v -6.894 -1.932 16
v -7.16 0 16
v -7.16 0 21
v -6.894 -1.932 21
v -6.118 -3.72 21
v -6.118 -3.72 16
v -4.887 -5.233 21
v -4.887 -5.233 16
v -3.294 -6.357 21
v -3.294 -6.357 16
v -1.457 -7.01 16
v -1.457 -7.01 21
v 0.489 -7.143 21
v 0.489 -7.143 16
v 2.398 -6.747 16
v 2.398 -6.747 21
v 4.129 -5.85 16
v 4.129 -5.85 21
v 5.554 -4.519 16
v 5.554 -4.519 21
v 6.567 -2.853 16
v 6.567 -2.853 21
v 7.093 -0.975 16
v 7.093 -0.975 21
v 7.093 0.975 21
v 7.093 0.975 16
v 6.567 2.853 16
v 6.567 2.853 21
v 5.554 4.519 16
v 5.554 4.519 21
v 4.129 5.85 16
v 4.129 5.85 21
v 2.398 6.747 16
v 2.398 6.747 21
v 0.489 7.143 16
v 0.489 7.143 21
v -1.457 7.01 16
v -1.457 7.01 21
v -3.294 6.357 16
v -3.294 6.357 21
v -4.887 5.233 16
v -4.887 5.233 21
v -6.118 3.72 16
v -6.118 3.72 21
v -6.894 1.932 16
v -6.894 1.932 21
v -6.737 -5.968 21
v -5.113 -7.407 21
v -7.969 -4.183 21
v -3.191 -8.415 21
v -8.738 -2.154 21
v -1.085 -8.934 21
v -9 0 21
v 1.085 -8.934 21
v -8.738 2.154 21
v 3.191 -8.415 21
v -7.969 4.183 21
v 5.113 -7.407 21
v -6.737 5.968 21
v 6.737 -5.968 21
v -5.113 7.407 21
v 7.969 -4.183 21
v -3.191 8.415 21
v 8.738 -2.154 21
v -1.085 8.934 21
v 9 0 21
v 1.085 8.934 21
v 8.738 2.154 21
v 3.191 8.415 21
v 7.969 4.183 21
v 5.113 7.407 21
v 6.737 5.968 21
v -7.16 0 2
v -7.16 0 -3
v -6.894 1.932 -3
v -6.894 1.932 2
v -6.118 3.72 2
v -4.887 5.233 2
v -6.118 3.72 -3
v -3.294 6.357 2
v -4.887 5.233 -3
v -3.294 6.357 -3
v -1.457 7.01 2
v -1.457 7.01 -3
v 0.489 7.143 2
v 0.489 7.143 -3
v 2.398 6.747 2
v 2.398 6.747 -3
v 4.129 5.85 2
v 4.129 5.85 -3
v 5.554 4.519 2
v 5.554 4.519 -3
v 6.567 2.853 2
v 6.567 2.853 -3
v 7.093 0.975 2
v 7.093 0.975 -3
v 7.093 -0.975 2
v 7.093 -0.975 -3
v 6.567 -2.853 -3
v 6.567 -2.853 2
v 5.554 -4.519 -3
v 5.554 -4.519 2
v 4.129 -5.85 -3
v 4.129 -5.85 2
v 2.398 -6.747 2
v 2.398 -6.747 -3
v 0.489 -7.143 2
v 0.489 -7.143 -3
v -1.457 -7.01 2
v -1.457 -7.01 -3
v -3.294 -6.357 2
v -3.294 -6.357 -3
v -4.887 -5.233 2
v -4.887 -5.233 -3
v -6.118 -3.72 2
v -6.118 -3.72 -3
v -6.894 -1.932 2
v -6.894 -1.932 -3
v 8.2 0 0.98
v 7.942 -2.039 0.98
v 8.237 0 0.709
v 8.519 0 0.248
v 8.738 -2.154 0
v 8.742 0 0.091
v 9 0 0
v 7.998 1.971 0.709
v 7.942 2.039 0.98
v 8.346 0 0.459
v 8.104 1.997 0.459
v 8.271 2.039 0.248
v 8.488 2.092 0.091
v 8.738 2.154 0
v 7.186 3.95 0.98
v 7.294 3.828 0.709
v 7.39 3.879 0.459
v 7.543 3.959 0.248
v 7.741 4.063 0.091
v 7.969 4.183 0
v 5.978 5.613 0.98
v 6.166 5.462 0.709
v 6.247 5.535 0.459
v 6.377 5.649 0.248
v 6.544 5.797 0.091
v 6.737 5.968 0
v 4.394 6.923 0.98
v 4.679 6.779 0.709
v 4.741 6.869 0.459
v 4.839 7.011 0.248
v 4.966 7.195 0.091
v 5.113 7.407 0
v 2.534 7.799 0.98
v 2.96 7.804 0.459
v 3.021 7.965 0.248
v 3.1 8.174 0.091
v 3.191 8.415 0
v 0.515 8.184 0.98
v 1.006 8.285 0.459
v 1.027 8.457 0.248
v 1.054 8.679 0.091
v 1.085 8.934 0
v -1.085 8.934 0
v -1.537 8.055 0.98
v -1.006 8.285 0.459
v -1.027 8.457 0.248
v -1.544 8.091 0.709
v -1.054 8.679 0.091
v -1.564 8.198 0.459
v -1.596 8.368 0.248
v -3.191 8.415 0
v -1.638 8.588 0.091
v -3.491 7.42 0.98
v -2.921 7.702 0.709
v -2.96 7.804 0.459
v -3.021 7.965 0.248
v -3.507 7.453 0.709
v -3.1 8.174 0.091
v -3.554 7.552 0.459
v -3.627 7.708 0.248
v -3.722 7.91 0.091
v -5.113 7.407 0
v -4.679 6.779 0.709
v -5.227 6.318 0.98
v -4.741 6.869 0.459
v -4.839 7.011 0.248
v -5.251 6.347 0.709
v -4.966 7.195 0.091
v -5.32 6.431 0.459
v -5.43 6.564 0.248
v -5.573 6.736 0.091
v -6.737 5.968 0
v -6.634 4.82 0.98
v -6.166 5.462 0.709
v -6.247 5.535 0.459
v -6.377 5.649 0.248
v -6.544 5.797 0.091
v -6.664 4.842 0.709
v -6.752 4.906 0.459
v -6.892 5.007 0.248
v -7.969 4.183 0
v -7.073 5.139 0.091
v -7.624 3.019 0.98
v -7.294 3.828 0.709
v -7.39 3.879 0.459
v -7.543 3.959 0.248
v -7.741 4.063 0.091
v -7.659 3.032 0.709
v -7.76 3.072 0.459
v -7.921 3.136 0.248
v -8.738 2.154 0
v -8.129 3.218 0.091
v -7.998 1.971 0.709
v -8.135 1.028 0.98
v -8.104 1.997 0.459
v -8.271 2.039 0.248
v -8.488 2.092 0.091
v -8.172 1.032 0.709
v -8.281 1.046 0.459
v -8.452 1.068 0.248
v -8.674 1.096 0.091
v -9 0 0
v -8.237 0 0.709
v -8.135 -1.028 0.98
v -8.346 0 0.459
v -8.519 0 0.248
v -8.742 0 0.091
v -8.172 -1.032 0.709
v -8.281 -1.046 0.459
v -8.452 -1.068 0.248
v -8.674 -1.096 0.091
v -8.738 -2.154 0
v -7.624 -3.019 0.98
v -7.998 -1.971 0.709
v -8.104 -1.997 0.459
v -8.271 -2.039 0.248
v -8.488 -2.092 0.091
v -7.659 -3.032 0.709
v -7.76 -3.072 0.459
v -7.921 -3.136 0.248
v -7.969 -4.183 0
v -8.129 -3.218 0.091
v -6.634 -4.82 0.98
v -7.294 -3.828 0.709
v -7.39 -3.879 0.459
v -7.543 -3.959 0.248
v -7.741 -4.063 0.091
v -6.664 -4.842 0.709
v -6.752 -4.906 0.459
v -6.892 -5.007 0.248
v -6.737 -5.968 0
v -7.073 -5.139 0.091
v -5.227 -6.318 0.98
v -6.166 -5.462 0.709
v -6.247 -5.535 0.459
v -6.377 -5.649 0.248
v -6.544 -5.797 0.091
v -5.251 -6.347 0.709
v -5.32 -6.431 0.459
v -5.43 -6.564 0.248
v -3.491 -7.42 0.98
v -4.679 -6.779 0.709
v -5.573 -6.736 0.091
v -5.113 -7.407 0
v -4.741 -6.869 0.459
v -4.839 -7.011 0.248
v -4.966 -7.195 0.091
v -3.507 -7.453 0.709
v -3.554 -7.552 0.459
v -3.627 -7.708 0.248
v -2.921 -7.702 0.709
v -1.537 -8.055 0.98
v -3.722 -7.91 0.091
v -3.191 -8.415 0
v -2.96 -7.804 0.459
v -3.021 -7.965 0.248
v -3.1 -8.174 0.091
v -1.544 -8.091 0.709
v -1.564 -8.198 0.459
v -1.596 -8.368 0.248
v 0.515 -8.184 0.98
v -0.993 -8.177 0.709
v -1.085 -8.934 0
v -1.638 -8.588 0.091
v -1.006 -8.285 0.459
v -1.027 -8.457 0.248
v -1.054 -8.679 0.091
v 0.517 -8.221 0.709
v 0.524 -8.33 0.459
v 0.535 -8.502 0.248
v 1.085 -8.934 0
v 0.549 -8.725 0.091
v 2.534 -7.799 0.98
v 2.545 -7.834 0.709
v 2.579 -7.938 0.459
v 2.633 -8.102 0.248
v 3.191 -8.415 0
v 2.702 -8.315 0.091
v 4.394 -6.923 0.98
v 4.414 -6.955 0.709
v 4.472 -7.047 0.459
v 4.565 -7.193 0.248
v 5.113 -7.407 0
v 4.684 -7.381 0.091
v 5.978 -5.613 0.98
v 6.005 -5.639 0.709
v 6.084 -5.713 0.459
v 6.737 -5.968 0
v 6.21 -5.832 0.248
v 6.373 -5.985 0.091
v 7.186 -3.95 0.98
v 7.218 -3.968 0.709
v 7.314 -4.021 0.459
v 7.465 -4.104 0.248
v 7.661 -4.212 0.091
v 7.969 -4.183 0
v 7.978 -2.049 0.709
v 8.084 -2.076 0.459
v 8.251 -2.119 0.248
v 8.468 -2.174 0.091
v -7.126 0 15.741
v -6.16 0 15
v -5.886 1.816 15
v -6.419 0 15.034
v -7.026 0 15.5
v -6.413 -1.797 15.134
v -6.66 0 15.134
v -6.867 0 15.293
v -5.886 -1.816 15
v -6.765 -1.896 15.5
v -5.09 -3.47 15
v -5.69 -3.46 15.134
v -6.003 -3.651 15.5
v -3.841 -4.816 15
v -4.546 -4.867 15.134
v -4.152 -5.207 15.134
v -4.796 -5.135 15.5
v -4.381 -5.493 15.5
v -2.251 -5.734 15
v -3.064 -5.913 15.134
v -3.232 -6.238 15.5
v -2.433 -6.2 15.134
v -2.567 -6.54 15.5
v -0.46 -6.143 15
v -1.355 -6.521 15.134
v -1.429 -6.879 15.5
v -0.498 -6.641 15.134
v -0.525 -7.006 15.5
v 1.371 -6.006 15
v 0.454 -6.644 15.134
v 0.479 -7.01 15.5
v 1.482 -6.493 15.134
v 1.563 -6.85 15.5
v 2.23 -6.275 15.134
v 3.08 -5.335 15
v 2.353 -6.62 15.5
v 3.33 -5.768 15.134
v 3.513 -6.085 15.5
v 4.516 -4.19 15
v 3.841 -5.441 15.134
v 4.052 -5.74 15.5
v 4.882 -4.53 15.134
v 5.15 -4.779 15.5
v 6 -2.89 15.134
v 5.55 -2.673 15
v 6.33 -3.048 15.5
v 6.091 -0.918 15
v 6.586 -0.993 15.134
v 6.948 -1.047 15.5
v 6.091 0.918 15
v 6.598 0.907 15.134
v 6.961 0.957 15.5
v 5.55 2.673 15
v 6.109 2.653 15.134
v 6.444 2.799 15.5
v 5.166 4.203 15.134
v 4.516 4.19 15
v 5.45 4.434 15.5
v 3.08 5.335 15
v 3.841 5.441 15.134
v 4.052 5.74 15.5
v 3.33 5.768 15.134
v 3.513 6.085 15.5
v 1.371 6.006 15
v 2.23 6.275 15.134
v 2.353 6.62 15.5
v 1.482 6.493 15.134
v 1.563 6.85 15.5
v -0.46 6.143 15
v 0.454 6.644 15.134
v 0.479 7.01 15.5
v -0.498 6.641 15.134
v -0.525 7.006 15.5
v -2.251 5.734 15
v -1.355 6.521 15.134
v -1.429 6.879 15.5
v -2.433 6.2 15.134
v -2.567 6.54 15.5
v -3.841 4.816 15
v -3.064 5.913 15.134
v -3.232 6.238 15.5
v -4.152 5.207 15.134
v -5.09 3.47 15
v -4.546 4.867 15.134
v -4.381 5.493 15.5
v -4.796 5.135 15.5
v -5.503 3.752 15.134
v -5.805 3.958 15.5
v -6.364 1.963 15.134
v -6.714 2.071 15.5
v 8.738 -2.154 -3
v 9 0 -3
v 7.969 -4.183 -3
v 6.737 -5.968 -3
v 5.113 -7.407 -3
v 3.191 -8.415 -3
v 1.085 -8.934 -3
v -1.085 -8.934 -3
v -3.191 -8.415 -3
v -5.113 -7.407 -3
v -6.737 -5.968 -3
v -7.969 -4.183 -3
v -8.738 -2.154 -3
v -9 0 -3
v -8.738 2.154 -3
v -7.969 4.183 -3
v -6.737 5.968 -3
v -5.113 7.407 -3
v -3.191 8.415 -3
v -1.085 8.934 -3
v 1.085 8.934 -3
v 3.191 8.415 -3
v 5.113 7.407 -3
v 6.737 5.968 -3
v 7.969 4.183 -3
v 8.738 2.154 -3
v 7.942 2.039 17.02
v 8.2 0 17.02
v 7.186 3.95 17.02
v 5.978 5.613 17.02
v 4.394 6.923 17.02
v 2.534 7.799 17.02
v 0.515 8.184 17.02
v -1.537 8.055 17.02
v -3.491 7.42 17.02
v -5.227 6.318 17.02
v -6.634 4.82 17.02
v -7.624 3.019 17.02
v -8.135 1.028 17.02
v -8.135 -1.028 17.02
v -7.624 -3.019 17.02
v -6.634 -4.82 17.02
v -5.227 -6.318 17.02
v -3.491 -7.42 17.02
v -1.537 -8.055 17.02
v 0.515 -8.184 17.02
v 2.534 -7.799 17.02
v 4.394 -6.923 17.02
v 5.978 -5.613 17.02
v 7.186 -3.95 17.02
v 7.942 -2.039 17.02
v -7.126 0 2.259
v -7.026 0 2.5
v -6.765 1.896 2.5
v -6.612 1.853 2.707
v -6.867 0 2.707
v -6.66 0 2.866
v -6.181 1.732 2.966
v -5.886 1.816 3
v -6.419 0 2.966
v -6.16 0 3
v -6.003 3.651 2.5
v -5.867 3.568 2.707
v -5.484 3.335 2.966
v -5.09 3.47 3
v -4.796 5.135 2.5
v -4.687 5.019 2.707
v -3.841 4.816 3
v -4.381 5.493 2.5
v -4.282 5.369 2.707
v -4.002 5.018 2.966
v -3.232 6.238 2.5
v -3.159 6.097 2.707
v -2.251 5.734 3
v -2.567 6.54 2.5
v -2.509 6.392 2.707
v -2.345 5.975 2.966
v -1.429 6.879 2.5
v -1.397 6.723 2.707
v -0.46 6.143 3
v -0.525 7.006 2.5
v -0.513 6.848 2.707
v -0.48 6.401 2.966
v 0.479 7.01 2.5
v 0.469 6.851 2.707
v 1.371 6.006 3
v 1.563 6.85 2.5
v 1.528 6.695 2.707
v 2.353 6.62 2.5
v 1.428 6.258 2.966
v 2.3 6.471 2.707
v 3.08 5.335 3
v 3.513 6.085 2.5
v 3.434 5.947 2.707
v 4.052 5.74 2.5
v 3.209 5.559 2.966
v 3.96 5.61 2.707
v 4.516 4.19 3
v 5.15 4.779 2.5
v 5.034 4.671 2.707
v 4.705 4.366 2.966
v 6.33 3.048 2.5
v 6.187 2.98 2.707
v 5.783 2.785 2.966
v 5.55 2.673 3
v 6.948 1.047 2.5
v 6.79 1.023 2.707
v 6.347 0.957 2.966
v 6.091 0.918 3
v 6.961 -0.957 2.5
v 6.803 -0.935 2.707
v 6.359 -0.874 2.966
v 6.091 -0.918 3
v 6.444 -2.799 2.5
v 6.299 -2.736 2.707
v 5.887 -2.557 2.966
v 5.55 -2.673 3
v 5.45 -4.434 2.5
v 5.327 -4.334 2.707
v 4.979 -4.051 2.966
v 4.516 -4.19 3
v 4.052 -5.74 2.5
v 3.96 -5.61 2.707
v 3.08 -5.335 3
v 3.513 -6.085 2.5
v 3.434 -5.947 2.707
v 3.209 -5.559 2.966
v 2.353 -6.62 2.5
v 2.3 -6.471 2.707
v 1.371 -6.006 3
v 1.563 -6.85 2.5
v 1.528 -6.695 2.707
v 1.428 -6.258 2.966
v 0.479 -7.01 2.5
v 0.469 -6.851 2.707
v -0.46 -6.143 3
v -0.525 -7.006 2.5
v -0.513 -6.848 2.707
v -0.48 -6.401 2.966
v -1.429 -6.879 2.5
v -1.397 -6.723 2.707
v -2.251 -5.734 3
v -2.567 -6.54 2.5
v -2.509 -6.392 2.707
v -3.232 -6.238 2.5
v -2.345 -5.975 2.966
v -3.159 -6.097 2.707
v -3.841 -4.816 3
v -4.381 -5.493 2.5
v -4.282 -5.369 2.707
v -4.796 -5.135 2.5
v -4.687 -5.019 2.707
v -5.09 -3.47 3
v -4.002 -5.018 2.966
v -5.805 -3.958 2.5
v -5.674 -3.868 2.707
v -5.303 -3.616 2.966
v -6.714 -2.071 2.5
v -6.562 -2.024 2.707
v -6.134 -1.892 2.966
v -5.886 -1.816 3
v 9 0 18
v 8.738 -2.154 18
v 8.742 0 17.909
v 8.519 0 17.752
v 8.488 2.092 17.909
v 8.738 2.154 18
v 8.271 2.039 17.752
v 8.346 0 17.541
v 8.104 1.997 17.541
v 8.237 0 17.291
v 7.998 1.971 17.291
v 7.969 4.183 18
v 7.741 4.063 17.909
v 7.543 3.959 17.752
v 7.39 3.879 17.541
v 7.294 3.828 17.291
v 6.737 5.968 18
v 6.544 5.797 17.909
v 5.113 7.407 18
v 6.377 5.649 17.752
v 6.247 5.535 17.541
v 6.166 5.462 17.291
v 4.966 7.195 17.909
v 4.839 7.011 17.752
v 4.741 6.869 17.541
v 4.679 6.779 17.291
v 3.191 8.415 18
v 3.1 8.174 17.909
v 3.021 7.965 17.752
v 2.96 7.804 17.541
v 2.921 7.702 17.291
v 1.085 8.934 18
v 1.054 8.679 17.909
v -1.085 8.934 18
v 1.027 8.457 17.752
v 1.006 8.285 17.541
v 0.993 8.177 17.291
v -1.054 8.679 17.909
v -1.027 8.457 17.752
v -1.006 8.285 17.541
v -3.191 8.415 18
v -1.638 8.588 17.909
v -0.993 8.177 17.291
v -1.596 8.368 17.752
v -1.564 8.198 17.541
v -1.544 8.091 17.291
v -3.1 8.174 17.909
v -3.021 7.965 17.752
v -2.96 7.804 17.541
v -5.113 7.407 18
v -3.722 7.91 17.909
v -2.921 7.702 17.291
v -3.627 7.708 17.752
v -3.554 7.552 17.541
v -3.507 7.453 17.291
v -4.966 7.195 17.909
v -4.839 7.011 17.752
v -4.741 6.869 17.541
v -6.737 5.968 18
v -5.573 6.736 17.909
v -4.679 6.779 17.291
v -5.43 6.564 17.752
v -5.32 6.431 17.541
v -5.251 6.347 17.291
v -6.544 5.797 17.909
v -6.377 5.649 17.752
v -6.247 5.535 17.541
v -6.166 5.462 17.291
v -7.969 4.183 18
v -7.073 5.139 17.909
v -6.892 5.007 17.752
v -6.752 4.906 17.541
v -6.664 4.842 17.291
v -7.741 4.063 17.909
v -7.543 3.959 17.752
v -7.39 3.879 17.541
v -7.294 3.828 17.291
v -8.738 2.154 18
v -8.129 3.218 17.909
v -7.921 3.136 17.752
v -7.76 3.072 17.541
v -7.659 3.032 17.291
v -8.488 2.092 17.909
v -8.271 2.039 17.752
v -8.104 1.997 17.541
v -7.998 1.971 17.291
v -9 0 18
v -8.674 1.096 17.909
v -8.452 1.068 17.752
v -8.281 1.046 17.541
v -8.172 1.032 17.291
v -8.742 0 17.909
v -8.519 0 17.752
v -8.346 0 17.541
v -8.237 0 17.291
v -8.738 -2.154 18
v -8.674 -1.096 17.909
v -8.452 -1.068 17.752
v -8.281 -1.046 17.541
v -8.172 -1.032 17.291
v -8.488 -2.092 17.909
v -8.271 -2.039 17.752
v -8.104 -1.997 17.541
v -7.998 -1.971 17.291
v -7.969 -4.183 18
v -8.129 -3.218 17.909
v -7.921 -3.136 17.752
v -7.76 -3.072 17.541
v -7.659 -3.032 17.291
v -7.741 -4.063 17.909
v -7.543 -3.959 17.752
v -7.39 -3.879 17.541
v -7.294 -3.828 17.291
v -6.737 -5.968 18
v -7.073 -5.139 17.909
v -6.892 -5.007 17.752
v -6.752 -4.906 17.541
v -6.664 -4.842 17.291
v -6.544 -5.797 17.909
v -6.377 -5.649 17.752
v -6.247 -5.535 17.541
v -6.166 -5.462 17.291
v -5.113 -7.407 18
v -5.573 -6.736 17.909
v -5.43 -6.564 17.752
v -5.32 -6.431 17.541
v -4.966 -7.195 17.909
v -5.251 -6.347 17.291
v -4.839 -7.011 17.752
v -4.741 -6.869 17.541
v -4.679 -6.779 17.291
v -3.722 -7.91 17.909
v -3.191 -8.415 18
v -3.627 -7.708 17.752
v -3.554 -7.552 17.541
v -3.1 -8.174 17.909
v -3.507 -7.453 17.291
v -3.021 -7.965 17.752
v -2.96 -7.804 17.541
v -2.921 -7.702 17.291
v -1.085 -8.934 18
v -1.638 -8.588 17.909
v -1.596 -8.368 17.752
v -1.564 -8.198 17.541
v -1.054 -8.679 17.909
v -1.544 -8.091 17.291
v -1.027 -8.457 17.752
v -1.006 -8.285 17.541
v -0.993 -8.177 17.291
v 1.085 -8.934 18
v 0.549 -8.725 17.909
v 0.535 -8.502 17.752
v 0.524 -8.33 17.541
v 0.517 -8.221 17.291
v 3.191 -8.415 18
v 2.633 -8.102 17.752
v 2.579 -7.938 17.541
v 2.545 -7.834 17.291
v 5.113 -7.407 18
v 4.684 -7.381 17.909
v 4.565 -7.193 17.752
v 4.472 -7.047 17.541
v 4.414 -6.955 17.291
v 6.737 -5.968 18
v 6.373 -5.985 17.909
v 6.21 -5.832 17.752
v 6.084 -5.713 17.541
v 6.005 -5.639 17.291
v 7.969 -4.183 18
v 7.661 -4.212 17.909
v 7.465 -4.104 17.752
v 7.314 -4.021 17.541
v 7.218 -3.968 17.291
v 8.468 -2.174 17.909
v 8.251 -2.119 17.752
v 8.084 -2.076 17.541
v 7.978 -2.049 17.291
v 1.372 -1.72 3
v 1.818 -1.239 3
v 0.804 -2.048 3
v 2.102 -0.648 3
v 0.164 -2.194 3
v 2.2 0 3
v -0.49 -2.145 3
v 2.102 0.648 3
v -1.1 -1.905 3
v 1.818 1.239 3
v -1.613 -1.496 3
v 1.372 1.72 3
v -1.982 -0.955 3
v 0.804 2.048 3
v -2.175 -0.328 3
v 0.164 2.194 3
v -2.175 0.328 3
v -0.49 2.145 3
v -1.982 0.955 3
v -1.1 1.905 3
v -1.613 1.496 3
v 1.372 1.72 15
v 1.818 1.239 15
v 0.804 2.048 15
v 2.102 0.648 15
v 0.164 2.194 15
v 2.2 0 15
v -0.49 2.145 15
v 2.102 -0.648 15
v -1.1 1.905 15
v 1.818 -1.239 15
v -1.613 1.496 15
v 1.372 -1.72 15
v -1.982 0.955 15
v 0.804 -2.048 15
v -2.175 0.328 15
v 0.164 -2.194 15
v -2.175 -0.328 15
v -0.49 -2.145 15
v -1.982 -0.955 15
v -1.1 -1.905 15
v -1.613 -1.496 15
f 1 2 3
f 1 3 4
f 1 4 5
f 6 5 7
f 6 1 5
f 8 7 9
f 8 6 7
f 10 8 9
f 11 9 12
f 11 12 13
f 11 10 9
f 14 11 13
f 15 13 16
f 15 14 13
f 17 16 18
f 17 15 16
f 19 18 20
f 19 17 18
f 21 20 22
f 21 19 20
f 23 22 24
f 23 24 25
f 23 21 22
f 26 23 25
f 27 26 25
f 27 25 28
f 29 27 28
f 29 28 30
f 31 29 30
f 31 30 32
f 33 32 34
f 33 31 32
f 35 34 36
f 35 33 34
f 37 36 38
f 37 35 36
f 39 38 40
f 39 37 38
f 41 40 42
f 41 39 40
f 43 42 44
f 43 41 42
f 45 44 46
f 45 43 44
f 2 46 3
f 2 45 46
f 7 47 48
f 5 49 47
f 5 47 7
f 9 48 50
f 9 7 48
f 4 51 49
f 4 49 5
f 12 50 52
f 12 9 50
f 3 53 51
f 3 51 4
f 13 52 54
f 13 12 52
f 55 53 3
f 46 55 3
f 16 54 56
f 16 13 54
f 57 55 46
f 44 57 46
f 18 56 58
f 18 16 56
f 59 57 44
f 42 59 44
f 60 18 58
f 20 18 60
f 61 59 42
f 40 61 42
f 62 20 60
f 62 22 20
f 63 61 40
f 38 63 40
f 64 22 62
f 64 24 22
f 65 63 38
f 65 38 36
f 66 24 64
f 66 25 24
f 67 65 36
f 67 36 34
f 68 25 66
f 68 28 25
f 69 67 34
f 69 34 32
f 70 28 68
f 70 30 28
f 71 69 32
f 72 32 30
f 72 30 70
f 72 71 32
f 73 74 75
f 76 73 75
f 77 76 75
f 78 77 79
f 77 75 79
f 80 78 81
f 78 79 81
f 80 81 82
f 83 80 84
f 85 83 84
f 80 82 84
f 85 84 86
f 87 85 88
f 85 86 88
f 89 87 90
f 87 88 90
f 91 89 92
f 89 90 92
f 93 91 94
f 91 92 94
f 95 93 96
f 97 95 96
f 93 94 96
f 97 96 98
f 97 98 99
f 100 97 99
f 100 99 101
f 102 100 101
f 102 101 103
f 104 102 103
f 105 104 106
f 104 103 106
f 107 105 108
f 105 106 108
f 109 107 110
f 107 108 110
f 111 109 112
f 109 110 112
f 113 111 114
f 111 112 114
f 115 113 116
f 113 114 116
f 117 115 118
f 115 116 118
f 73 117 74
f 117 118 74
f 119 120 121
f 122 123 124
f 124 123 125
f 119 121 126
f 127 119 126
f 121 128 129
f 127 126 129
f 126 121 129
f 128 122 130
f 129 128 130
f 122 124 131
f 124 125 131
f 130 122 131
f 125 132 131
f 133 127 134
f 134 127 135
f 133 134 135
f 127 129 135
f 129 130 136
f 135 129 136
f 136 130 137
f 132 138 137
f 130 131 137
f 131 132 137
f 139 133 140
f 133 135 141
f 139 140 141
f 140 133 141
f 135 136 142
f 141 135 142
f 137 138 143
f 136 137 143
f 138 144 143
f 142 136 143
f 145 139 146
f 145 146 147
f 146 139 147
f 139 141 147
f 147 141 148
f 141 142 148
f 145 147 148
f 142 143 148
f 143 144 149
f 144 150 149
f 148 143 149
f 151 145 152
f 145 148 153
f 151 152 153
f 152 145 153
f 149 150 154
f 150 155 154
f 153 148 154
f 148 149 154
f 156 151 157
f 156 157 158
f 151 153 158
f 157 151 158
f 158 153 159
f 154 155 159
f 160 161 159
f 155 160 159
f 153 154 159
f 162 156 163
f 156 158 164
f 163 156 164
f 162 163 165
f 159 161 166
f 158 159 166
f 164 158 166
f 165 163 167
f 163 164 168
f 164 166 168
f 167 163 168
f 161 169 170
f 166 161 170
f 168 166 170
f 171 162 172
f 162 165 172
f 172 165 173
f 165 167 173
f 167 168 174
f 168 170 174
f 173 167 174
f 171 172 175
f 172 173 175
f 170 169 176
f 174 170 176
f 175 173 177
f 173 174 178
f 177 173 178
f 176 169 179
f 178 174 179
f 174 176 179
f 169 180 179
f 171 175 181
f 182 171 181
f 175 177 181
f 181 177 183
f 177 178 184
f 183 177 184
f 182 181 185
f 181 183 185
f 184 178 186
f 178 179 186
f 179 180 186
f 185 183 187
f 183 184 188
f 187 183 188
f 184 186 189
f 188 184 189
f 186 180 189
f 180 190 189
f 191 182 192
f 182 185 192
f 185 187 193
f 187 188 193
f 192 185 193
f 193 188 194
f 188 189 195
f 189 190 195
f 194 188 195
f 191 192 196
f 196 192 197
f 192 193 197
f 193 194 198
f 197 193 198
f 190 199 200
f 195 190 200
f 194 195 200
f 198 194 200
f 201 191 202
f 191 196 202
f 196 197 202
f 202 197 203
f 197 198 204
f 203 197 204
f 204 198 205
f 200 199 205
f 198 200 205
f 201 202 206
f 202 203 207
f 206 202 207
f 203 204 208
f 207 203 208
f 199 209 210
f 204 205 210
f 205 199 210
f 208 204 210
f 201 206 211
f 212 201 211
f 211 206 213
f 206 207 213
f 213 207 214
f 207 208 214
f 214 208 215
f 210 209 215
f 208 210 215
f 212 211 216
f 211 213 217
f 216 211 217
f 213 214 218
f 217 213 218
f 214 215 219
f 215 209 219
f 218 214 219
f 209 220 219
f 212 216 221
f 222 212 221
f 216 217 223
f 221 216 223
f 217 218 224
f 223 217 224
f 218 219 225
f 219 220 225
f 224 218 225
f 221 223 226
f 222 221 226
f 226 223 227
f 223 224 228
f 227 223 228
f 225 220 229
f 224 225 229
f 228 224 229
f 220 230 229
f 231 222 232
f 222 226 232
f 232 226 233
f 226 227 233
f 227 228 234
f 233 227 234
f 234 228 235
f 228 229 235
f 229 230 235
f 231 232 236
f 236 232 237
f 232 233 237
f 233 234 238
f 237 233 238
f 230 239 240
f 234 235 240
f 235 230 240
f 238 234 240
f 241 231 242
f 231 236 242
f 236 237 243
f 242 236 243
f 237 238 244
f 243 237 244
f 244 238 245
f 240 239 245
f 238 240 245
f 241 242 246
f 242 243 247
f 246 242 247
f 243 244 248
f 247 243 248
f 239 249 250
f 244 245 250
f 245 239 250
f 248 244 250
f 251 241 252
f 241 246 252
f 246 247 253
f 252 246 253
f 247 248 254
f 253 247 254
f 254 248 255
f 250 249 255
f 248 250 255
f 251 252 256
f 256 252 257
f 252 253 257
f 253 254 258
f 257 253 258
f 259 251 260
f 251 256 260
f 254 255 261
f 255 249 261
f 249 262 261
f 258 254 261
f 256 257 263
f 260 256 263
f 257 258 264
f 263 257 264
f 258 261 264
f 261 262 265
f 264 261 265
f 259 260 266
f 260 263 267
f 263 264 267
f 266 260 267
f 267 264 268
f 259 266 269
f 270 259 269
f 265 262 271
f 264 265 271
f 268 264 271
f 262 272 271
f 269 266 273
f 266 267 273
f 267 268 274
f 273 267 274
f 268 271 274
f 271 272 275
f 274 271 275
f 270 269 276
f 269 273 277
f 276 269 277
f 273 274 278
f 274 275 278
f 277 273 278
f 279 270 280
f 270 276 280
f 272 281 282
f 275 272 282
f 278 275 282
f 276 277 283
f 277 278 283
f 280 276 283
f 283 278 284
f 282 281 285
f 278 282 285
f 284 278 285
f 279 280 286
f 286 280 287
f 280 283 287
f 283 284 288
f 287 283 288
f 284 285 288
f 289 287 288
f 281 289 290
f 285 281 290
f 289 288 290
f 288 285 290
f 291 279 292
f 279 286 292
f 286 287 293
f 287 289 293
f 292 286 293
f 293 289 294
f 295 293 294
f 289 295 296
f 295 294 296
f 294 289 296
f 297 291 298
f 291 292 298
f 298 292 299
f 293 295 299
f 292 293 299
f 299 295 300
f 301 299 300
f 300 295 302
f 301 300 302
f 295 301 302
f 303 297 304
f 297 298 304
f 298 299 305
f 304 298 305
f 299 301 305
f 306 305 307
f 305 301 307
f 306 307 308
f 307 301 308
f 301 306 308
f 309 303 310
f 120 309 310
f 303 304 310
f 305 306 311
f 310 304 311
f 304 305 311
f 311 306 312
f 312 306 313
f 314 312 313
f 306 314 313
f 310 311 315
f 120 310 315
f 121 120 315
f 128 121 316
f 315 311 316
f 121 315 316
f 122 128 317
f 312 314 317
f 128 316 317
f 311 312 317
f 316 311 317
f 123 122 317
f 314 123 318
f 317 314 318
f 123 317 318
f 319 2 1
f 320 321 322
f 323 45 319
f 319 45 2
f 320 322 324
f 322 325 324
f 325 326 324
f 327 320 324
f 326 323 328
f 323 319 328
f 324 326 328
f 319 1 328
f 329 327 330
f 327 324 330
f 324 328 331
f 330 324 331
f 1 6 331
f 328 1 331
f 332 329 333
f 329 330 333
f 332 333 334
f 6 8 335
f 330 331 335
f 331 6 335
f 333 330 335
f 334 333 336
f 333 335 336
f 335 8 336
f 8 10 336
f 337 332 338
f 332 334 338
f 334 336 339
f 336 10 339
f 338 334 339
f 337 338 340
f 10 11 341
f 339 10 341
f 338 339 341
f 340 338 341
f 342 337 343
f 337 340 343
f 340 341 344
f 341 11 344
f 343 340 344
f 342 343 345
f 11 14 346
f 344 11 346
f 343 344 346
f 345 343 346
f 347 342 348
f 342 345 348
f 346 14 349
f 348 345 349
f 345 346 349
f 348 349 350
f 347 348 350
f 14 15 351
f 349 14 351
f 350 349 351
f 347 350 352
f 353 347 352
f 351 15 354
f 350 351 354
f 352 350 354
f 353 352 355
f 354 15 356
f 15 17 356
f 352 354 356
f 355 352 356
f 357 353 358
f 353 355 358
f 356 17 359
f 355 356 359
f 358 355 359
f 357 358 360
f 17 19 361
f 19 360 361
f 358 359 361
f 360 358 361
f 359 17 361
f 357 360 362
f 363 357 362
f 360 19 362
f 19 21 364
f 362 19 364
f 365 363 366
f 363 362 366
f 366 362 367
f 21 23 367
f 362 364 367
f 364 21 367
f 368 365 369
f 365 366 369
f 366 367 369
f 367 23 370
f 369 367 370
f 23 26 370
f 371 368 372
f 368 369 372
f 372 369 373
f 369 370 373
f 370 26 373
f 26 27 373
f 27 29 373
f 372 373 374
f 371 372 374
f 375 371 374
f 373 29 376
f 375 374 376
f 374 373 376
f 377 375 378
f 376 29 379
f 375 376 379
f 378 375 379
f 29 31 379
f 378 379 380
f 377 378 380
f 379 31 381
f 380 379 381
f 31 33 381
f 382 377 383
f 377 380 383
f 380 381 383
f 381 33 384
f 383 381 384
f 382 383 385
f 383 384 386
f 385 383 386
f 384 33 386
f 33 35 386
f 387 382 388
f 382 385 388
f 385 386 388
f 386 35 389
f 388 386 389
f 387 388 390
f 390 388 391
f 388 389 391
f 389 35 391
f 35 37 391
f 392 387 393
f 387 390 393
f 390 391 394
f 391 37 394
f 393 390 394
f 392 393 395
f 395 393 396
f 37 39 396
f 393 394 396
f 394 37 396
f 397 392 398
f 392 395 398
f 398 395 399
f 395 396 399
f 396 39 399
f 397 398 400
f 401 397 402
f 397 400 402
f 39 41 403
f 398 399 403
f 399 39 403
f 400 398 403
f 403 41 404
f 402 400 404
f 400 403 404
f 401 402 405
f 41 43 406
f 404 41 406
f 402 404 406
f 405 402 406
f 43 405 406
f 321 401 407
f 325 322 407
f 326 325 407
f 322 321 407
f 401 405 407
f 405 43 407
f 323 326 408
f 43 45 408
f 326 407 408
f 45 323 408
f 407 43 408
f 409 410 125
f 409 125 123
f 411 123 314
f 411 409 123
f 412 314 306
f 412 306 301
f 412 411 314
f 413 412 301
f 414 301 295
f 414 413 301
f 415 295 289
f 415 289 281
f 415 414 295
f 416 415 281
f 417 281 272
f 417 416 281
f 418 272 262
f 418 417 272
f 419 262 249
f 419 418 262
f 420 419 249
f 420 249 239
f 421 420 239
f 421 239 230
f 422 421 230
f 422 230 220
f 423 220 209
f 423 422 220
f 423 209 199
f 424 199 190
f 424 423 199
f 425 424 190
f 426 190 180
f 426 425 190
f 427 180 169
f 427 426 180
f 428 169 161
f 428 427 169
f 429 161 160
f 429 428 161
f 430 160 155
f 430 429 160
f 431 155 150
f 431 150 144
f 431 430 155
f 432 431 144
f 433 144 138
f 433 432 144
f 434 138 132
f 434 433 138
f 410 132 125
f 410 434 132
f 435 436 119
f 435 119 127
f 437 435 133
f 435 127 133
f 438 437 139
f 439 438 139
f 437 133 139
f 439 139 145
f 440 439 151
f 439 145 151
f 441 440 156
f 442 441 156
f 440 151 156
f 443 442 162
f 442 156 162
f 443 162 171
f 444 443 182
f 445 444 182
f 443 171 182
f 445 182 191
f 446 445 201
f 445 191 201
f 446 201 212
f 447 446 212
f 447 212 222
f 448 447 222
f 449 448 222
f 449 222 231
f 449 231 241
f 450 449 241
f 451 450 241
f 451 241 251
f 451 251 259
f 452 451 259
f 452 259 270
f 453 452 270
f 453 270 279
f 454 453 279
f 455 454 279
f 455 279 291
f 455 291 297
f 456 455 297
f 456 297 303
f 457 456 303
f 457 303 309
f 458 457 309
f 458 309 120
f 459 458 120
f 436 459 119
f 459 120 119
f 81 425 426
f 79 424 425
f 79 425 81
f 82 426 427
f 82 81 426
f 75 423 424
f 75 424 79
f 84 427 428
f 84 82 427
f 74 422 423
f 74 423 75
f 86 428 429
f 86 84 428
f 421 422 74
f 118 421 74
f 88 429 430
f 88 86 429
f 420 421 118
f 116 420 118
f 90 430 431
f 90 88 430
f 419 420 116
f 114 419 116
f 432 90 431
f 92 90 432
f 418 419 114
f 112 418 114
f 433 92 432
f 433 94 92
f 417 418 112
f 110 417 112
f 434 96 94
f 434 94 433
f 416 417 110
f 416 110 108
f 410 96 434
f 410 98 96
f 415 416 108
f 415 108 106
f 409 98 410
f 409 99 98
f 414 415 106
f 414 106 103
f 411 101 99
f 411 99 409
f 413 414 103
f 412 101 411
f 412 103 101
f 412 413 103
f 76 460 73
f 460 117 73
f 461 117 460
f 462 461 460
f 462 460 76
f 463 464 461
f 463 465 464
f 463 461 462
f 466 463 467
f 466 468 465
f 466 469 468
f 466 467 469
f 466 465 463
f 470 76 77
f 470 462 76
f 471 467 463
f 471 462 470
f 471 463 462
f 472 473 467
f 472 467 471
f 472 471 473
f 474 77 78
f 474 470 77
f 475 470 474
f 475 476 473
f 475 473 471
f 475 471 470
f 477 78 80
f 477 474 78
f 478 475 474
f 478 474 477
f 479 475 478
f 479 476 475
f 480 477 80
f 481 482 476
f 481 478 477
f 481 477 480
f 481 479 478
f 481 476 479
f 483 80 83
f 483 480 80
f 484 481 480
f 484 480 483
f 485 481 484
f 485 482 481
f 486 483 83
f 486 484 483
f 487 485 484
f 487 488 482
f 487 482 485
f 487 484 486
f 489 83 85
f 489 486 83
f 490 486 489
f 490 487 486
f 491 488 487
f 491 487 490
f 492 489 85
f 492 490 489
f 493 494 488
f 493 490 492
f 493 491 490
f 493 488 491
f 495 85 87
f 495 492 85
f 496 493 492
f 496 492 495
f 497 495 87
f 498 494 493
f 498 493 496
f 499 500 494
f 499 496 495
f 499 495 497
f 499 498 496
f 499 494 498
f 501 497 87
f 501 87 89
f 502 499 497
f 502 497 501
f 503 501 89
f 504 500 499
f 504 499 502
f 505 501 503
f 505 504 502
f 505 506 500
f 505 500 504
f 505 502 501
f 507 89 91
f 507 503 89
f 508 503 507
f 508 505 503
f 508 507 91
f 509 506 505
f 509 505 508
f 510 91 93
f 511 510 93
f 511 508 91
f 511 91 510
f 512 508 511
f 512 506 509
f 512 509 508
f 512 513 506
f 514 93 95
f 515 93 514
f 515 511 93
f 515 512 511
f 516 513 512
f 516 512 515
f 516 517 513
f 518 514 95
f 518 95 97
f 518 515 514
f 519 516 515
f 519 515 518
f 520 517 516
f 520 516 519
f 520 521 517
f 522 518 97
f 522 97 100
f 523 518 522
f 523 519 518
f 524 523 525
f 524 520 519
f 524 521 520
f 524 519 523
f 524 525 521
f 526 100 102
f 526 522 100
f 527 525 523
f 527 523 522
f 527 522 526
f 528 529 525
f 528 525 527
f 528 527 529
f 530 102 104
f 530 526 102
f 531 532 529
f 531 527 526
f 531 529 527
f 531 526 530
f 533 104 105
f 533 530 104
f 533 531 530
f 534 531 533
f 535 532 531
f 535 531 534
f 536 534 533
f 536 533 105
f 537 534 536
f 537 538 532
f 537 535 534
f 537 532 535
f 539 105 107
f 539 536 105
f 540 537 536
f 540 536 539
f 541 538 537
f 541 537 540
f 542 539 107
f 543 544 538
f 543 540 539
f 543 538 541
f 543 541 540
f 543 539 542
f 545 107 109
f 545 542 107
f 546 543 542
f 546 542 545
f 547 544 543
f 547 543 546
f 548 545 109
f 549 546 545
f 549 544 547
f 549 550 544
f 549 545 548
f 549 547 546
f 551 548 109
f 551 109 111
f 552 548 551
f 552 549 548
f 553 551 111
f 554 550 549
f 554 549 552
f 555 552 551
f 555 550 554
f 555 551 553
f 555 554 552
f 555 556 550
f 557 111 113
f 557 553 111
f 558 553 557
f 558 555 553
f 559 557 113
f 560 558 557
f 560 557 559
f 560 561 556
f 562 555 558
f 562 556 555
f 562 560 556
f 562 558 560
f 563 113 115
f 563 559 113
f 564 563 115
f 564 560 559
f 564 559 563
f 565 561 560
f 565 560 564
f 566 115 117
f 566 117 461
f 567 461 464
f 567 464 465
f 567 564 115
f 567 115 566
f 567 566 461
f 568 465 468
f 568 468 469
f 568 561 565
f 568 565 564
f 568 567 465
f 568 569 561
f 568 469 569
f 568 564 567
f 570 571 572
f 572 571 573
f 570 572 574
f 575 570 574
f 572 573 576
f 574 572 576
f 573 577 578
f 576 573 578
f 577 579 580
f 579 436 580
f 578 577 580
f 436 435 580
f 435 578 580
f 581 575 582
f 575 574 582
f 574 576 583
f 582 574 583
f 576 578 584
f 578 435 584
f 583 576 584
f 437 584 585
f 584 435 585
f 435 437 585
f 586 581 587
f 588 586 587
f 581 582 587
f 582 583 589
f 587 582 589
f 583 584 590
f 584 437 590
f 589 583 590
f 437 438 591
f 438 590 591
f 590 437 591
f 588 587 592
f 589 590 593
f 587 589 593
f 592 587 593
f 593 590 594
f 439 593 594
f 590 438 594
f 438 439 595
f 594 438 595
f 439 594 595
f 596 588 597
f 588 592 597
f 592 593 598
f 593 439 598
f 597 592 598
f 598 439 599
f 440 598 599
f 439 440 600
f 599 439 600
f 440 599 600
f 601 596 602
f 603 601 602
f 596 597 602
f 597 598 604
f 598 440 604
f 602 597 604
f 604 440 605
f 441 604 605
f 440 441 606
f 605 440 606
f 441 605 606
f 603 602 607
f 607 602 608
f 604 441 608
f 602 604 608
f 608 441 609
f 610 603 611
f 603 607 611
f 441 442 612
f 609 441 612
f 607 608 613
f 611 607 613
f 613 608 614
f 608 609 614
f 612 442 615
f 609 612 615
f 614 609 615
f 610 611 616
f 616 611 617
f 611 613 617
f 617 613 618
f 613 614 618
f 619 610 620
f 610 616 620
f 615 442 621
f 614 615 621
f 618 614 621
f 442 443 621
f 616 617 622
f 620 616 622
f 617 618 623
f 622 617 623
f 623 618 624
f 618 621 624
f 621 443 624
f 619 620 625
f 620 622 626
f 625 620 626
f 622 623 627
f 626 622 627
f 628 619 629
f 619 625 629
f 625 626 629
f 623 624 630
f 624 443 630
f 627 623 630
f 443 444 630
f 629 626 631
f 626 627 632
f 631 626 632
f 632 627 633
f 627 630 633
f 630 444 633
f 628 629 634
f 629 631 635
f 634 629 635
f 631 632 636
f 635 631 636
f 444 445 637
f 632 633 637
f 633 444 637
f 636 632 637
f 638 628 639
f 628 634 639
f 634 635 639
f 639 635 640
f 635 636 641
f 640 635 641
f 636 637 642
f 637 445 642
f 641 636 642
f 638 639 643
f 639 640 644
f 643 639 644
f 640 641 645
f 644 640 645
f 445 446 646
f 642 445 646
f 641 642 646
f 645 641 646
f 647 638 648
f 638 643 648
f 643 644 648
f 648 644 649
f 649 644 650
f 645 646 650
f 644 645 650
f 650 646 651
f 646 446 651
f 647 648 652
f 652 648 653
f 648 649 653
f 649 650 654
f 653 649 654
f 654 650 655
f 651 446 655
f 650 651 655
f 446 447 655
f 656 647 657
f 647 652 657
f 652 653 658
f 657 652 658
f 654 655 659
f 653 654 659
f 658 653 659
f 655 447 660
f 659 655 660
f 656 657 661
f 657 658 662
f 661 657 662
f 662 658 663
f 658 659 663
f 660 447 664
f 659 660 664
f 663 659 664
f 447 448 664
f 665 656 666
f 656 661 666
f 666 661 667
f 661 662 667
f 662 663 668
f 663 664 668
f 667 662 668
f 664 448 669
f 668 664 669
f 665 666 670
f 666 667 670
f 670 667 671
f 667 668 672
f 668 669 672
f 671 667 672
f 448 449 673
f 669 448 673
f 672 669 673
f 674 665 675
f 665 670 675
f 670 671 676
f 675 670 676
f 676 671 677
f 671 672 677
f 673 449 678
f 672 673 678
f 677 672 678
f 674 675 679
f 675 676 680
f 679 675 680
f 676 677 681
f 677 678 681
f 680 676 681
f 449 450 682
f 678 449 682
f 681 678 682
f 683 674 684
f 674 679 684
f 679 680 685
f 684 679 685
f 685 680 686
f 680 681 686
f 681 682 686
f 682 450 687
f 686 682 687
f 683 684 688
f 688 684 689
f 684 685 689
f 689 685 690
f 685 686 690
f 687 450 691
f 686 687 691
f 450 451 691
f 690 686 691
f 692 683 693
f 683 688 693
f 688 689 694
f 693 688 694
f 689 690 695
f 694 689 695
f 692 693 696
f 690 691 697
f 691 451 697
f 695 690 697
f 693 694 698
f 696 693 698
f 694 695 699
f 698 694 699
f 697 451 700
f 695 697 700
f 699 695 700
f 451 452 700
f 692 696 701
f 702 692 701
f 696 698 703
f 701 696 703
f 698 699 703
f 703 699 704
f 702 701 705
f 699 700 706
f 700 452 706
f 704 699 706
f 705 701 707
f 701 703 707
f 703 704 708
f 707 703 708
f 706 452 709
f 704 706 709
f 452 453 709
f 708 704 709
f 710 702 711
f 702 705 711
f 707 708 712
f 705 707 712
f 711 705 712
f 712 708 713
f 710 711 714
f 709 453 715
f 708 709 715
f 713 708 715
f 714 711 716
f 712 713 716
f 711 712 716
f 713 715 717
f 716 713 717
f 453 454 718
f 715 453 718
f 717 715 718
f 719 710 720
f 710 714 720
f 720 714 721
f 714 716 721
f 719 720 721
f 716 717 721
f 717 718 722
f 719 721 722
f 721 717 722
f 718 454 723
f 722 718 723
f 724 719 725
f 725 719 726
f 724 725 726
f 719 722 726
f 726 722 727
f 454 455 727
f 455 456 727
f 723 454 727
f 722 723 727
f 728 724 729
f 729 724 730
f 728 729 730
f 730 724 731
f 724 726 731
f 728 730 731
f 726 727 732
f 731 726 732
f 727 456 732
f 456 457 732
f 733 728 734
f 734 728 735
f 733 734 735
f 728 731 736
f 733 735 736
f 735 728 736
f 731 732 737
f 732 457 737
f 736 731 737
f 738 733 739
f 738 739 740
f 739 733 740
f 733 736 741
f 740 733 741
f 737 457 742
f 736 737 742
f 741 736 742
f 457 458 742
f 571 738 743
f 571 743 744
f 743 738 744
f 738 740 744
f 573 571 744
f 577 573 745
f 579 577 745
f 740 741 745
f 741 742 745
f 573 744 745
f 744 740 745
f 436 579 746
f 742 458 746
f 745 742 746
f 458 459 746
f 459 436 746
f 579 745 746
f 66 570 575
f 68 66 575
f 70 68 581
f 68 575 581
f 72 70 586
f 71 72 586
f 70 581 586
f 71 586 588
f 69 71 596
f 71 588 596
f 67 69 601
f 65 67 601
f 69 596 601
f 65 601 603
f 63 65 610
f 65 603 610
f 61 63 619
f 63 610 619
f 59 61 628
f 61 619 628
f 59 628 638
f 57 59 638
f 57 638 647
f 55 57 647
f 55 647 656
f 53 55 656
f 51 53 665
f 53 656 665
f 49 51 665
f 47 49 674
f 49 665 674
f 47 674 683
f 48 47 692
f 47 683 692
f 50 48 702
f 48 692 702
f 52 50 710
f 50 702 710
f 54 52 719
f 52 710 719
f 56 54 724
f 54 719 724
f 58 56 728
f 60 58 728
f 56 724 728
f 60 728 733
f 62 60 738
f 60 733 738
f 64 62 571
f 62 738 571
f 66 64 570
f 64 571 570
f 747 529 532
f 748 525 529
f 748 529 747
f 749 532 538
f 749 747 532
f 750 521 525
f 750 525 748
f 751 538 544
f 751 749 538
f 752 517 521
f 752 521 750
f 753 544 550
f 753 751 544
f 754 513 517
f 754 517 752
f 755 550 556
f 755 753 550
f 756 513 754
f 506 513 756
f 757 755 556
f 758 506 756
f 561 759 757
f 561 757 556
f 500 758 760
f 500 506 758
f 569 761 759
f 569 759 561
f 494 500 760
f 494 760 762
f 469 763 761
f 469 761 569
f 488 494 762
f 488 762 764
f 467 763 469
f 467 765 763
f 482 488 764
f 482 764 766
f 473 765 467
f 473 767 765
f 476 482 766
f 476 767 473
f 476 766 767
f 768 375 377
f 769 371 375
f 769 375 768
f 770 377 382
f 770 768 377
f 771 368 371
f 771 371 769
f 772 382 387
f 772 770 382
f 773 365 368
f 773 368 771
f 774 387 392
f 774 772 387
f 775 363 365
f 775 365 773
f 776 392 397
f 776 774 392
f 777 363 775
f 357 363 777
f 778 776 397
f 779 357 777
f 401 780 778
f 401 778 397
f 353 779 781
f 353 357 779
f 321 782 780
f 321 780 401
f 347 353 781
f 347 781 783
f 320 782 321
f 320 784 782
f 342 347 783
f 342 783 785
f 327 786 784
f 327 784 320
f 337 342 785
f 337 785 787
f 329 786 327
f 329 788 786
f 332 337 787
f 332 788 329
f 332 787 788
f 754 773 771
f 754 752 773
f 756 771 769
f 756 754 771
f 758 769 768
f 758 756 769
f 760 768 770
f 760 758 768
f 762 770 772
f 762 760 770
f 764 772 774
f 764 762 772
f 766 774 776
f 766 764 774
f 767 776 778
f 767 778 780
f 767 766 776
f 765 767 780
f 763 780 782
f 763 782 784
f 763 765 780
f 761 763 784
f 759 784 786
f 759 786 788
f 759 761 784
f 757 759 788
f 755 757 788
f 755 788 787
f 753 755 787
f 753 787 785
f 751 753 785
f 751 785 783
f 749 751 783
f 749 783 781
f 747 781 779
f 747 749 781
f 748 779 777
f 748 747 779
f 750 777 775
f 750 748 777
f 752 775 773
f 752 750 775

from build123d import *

# Parameters (mm, degrees)
SZKIC1_R                    = 8.2
SZKIC1_R_2                  = 2.2
DODANIE_WYCI_GNI_CIE6_DEPTH = 18
SZKIC6_R                    = 9
SZKIC6_R_2                  = 2.2
DODANIE_WYCI_GNI_CIE7_DEPTH = 3
DODANIE_WYCI_GNI_CIE8_START = 3
SZKIC7_R                    = 9
SZKIC7_R_2                  = 2.2
DODANIE_WYCI_GNI_CIE8_DEPTH = 3
SZKIC8_R                    = 7.16
WYTNIJ_WYCI_GNI_CIE2_DEPTH  = 6
WYTNIJ_WYCI_GNI_CIE3_START  = -6
SZKIC9_R                    = 7.16
SZKIC9_R_2                  = 2.2
WYTNIJ_WYCI_GNI_CIE3_DEPTH  = 6
ZAOKR_GLENIE2_R             = 1
ZAOKR_GLENIE3_R             = 1
ZAOKR_GLENIE4_R             = 1


with BuildPart() as part:
    # Szkic1 → Dodanie-wyciągnięcie6 (new body)
    with BuildSketch(Plane.XY):
        Circle(SZKIC1_R)
        Circle(SZKIC1_R_2, mode=Mode.SUBTRACT)
    extrude(amount=DODANIE_WYCI_GNI_CIE6_DEPTH)

    # Szkic6 → Dodanie-wyciągnięcie7 (add)
    with BuildSketch(Plane.XY.offset(18)):
        Circle(SZKIC6_R)
        Circle(SZKIC6_R_2, mode=Mode.SUBTRACT)
    extrude(amount=DODANIE_WYCI_GNI_CIE7_DEPTH)

    # Szkic7 → Dodanie-wyciągnięcie8 (add)
    with BuildSketch(Plane(origin=(0, 0, 0), x_dir=(-1, 0, 0), z_dir=(0, 0, -1)).offset(DODANIE_WYCI_GNI_CIE8_START)):
        with Locations(Location((0, 0, 0), (0, 0, 180))):
            Circle(SZKIC7_R)
        Circle(SZKIC7_R_2, mode=Mode.SUBTRACT)
    extrude(amount=-DODANIE_WYCI_GNI_CIE8_DEPTH)

    # Szkic8 → Wytnij-wyciągnięcie2 (cut)
    with BuildSketch(Plane(origin=(0, 0, -3), x_dir=(-1, 0, 0), z_dir=(0, 0, -1))):
        Circle(SZKIC8_R)
    extrude(amount=-WYTNIJ_WYCI_GNI_CIE2_DEPTH, mode=Mode.SUBTRACT)

    # Szkic9 → Wytnij-wyciągnięcie3 (cut)
    with BuildSketch(Plane.XY.offset(21).offset(WYTNIJ_WYCI_GNI_CIE3_START)):
        with Locations(Location((0, 0, 0), (0, 0, 180))):
            Circle(SZKIC9_R)
        with Locations(Location((0, 0, 0), (0, 0, 180))):
            Circle(SZKIC9_R_2, mode=Mode.SUBTRACT)
    extrude(amount=WYTNIJ_WYCI_GNI_CIE3_DEPTH, mode=Mode.SUBTRACT)

    # Zaokrąglenie2
    # the kernel refuses this fillet: 1 mm, written as the material it adds along each edge
    with BuildSketch(Plane(origin=(0, 0, 0), x_dir=(1, 0, 0), z_dir=(0, -1, 0))) as zaokr_glenie2_piece_1:
        with BuildLine():
            CenterArc((9.2, 0.979795897), ZAOKR_GLENIE2_R, 180, 78.463040967)
            Line((9, 0), (8.996, -0.019595918))
            ThreePointArc((8.996, -0.019595918), (8.6, -0.02), (8.2, -0.02))
            Line((8.2, -0.02), (8.18, 0))
            Line((8.18, 0), (8.18, 0.979795897))
            Line((8.18, 0.979795897), (8.2, 0.979795897))
        make_face()
    revolve(axis=Axis((0, 0, 0), (0, 0, 1)))
    with BuildSketch(Plane(origin=(0, 0, 18), x_dir=(1, 0, 0), z_dir=(0, -1, 0))) as zaokr_glenie2_piece_2:
        with BuildLine():
            CenterArc((9.2, -0.979795897), ZAOKR_GLENIE2_R, 101.536959033, 78.463040967)
            Line((9, 0), (8.996, 0.019595918))
            ThreePointArc((8.996, 0.019595918), (8.6, 0.02), (8.2, 0.02))
            Line((8.2, 0.02), (8.18, 0))
            Line((8.18, 0), (8.18, -0.979795897))
            Line((8.18, -0.979795897), (8.2, -0.979795897))
        make_face()
    revolve(axis=Axis((0, 0, 18), (0, 0, 1)))

    # Zaokrąglenie3
    zaokr_glenie3_edges = [part.edges().sort_by_distance(p)[0] for p in [
        (7.16, 0, 3),
    ]]
    fillet(zaokr_glenie3_edges, radius=ZAOKR_GLENIE3_R)

    # Zaokrąglenie4
    zaokr_glenie4_edges = [part.edges().sort_by_distance(p)[0] for p in [
        (7.16, 0, 15),
    ]]
    fillet(zaokr_glenie4_edges, radius=ZAOKR_GLENIE4_R)


solid = part.part
